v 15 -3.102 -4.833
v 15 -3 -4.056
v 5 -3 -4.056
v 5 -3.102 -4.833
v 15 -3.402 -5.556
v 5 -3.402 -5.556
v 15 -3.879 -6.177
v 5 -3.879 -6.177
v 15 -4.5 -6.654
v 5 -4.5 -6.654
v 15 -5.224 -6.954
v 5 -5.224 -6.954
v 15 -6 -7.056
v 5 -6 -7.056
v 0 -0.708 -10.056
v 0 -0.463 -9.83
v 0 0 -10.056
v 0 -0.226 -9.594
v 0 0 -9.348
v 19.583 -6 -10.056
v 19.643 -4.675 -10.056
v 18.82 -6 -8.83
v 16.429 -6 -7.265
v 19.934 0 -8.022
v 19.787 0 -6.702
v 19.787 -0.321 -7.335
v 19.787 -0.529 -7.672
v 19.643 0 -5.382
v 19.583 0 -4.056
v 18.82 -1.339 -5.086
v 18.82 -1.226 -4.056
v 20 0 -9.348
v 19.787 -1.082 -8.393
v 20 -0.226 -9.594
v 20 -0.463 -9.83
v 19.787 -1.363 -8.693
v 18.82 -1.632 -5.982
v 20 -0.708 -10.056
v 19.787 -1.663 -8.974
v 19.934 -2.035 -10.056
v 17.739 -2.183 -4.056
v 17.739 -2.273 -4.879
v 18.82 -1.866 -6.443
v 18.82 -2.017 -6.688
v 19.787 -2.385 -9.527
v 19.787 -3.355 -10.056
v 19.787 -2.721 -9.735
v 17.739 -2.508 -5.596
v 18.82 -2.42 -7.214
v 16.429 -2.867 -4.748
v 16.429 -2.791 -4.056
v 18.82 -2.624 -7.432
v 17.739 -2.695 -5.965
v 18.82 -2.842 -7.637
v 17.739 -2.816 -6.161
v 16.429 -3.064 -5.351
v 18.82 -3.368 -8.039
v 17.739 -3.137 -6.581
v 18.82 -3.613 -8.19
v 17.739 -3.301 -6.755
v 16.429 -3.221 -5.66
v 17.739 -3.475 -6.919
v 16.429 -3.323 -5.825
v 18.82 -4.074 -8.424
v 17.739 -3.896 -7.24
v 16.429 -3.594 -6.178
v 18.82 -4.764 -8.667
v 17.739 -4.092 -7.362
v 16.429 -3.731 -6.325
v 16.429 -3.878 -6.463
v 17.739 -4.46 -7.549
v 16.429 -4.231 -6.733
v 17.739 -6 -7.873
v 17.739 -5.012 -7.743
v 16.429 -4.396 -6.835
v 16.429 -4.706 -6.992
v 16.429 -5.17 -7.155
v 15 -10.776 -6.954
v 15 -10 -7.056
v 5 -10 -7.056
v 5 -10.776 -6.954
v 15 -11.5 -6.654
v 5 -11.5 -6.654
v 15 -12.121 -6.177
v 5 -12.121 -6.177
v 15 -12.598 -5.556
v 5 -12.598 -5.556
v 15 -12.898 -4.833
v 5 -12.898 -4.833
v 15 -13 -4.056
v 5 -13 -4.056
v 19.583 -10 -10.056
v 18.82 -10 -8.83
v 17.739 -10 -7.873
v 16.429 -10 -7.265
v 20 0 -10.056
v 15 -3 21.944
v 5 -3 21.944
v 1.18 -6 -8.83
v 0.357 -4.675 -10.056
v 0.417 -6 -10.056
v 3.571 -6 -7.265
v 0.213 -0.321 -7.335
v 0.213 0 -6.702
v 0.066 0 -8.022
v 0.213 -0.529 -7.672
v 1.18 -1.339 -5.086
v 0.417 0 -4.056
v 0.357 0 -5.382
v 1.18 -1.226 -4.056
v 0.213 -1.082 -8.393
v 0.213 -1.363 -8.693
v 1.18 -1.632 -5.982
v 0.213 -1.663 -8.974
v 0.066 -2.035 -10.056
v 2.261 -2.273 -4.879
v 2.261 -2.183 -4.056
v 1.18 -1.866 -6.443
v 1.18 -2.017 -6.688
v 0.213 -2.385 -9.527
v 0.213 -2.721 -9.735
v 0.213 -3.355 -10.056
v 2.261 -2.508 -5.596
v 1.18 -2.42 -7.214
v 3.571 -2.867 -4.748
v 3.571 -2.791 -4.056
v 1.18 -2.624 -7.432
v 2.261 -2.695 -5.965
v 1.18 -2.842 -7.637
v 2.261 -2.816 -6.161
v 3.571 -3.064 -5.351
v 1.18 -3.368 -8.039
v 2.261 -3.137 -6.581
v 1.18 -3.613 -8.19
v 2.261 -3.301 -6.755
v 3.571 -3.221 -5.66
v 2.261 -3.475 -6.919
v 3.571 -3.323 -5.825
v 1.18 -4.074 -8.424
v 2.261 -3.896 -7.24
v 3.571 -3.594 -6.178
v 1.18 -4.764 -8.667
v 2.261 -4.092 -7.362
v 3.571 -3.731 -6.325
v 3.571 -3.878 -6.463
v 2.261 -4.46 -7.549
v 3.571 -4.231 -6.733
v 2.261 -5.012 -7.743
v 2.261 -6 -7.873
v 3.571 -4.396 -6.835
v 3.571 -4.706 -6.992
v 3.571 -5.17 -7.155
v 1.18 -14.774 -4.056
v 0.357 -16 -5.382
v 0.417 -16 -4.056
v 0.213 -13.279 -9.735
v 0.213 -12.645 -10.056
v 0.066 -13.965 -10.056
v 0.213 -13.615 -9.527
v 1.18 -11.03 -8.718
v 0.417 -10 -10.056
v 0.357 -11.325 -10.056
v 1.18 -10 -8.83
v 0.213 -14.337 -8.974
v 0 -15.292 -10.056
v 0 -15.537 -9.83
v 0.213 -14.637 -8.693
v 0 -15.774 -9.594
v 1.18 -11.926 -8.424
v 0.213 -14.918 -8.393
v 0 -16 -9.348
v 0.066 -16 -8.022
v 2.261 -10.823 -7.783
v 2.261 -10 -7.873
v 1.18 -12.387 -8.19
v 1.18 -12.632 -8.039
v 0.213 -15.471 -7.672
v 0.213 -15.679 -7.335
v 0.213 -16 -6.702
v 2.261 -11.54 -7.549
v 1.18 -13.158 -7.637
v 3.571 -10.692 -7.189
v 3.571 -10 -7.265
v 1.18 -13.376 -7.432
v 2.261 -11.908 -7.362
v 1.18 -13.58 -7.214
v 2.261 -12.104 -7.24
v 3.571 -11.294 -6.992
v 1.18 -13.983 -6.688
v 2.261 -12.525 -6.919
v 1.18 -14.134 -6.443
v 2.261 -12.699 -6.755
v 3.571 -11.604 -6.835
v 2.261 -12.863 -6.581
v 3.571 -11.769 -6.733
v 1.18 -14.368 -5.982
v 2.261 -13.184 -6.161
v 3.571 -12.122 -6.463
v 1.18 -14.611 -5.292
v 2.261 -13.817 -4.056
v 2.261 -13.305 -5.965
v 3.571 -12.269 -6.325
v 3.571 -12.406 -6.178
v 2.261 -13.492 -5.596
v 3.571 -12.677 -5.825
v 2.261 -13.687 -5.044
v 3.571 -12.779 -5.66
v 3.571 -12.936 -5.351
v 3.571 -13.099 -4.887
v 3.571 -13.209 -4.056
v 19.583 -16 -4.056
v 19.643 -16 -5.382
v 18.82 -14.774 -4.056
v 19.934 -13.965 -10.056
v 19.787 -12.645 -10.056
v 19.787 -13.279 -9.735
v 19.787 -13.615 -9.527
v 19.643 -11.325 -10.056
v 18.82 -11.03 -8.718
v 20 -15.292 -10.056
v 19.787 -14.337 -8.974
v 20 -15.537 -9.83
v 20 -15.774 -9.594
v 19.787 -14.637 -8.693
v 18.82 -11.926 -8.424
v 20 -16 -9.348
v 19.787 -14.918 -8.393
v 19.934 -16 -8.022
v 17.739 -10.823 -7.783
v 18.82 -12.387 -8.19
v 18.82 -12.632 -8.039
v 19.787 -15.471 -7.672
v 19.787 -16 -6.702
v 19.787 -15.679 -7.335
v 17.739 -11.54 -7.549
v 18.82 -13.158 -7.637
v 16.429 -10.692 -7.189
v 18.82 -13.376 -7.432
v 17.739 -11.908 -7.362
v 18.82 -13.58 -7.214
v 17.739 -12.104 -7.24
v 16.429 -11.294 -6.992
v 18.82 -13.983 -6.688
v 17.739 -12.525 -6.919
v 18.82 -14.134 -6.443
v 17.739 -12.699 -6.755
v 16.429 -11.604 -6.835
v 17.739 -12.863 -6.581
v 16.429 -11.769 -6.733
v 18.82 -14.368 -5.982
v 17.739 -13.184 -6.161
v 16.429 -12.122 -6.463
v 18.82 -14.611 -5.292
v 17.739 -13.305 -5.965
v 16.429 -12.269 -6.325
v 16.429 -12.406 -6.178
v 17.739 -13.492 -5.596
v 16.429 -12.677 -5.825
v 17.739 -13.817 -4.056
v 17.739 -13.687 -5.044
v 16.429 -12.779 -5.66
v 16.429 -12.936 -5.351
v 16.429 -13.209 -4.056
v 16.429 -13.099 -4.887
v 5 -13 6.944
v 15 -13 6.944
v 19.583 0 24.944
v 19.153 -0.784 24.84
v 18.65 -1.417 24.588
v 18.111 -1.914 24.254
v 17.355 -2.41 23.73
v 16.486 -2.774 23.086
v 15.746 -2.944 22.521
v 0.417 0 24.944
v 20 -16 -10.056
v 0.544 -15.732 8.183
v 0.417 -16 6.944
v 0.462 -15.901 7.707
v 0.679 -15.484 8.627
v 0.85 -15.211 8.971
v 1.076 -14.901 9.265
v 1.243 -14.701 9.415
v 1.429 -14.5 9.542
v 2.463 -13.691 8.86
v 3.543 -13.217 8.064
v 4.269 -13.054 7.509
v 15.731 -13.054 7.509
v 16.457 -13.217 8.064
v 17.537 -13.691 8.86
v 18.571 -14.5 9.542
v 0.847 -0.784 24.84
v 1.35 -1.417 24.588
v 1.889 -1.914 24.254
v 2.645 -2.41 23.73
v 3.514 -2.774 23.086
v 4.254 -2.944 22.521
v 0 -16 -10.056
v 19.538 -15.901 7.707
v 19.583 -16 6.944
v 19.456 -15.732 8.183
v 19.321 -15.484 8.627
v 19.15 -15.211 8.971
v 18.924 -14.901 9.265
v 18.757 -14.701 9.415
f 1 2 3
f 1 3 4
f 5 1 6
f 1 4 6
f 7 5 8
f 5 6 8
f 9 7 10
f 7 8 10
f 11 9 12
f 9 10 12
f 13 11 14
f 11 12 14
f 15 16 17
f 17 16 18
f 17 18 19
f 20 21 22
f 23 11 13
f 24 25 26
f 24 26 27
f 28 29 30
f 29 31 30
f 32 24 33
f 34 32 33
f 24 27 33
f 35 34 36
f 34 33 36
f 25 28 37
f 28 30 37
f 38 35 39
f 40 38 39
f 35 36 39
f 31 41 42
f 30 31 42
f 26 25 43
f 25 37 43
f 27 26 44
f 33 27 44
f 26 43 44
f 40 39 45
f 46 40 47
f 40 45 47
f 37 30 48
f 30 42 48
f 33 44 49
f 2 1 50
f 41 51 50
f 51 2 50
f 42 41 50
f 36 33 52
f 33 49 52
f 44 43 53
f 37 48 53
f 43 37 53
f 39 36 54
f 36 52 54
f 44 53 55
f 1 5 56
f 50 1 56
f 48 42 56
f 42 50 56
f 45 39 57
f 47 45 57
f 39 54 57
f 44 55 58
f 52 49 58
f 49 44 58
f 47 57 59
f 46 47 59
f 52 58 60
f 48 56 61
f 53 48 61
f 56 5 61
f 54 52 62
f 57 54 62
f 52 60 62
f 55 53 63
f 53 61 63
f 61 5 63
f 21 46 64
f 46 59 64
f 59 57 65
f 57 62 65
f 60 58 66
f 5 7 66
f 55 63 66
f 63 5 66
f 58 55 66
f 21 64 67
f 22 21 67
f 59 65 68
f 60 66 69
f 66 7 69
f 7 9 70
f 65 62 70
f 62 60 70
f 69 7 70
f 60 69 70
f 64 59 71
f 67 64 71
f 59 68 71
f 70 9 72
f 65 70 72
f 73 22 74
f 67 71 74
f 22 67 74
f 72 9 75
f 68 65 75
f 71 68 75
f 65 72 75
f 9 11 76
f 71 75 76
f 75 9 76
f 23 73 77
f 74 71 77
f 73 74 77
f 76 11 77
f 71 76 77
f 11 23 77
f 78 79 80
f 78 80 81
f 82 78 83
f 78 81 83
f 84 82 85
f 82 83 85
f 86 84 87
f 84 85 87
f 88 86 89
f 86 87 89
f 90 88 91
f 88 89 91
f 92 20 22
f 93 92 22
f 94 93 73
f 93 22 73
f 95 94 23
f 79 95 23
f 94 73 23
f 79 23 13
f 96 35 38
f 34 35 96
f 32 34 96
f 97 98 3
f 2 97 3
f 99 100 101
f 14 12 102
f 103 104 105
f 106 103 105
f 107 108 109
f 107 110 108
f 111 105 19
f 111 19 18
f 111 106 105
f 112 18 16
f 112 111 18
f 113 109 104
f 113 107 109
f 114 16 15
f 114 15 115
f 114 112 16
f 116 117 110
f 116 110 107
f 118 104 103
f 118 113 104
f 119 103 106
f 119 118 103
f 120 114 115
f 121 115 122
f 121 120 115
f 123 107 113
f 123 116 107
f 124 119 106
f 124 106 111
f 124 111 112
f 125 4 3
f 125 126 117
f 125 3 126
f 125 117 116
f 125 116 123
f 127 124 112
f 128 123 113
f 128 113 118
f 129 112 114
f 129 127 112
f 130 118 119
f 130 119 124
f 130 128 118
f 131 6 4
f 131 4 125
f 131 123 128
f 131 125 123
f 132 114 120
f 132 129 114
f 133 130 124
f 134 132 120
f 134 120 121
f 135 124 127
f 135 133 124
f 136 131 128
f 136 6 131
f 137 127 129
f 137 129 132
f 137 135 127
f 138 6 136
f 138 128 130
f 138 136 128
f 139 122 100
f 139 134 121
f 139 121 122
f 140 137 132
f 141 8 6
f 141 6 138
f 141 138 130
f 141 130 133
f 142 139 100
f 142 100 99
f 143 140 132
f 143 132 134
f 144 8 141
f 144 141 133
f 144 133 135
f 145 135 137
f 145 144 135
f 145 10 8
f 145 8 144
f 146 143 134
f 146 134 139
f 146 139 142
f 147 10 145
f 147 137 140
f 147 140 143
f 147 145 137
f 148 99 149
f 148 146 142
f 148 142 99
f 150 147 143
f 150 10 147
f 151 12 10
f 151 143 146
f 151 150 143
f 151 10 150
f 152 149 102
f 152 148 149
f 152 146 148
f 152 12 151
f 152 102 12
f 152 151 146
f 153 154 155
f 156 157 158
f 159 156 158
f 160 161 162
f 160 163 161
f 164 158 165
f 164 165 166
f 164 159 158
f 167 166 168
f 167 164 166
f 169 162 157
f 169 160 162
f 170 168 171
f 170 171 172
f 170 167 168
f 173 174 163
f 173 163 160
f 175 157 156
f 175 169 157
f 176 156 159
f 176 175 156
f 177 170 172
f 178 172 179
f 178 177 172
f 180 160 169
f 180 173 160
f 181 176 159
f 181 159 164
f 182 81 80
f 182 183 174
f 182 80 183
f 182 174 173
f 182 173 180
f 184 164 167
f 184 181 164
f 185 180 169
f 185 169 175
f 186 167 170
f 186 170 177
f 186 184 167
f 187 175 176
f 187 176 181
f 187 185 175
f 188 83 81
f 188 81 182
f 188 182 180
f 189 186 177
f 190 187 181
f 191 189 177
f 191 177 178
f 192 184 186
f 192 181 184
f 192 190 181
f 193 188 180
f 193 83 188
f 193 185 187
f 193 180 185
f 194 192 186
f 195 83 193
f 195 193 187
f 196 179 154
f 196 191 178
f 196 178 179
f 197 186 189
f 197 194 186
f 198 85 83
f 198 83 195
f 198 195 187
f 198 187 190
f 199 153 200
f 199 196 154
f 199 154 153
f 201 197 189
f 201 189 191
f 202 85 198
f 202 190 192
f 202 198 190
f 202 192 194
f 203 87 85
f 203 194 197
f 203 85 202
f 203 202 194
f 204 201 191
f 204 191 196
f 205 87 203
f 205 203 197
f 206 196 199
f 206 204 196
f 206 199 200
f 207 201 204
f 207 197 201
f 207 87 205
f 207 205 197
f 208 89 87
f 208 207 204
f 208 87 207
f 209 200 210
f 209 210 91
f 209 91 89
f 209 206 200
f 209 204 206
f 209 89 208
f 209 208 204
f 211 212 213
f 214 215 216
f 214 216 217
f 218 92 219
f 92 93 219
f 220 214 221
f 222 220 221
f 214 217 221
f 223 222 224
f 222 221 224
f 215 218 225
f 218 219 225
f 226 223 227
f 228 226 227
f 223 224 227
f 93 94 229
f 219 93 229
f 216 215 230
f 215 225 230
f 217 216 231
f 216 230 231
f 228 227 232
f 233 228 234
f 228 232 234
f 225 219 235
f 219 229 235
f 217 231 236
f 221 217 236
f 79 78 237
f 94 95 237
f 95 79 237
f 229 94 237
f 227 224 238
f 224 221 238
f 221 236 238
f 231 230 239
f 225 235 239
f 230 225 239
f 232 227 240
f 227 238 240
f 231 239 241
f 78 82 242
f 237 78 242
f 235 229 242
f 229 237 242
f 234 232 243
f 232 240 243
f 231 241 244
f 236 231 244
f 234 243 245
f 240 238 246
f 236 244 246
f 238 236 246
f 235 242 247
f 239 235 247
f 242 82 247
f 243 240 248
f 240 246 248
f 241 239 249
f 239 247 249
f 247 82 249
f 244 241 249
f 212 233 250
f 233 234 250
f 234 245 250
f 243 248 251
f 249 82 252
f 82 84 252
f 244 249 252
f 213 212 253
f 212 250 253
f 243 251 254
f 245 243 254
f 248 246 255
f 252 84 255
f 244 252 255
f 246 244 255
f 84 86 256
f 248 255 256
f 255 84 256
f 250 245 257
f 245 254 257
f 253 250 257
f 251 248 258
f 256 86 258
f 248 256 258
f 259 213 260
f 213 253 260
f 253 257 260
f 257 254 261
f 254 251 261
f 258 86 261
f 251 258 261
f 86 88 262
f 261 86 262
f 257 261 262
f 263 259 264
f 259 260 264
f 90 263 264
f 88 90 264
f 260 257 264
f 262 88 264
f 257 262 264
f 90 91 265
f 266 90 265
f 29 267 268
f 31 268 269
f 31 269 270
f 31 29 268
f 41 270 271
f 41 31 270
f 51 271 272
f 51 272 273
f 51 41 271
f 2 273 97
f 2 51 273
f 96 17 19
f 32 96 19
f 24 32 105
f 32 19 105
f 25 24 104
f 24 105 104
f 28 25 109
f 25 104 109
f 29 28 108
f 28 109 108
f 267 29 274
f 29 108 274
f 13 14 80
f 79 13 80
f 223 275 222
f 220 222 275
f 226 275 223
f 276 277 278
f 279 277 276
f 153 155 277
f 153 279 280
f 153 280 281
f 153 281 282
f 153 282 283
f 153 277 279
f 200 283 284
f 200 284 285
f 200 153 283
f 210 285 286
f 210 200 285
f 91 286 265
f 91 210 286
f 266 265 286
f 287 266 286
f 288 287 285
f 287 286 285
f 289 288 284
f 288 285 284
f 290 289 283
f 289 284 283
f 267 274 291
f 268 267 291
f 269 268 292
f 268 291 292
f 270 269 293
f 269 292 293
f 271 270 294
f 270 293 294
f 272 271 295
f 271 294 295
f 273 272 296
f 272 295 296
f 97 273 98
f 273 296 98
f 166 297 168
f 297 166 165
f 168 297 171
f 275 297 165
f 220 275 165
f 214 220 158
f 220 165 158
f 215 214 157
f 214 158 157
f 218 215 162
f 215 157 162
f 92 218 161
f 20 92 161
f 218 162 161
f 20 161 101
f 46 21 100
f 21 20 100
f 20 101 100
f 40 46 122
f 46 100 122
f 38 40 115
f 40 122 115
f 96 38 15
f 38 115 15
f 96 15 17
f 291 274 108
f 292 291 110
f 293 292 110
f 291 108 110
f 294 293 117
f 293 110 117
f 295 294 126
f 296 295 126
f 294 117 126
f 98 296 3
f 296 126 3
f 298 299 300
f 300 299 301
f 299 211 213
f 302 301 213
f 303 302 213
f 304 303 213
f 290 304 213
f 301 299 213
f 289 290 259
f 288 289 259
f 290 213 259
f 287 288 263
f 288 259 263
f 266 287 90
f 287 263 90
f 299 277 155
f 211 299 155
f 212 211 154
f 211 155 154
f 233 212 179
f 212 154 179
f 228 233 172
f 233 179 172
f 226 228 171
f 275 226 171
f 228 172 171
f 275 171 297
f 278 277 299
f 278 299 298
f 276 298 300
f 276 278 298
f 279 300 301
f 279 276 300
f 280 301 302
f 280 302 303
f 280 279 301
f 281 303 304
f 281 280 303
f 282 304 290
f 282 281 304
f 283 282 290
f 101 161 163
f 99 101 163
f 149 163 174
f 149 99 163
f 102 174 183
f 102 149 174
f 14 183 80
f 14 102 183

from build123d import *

# Parameters (mm, degrees)
F1_DEPTH     = 20
F2_T1_DEPTH  = 20
F2_T3_DEPTH  = 35
F3_T1_DEPTH  = 4
F3_T3_DEPTH  = 23.5
F3_T5_DEPTH  = 38.5
F3_T8_ANGLE  = 89.9999999987
F3_T10_ANGLE = 89.9999999987
F3_T12_ANGLE = 89.9999999987
F3_T14_ANGLE = 89.9999999987
F3_T18_ANGLE = 359.64
F3_S19_R     = 5
F3_T20_DEPTH = 6
F3_T24_ANGLE = 359.64
F3_S25_R     = 5
F3_T26_DEPTH = 6
F3_T30_ANGLE = 328.8283154119
F3_S31_R     = 5
F3_T32_DEPTH = 6
F3_T36_ANGLE = 328.8283154119
F3_S37_R     = 5
F3_T38_DEPTH = 6


# Not quite as in the source:
# - a fillet or chamfer that OpenCascade refuses, or shapes differently, is made with other operations: its cross-section is extruded or revolved along the edge and cut away or added


with BuildPart() as f1:
    # F0 (on Right) → F1 (new body)
    with BuildSketch(Plane.YZ):
        Polygon((0, -10.05617938), (0, 24.94382062), (-3, 24.94382062), (-3, -7.05617938), (-13, -7.05617938), (-13, 9.94382062), (-16, 9.94382062), (-16, -10.05617938), align=None)
    extrude(amount=F1_DEPTH)

    # F2: fillet of radius 3 on 5 edges, made by hand

    # F2_s2 → F2_t1 (join)
    with BuildSketch(Plane.YZ):
        with BuildLine():
            ThreePointArc((-10, -7.05617938), (-12.1213203436, -6.1774997235), (-13, -4.05617938))
            Line((-13, -4.05617938), (-13, -7.05617938))
            Line((-13, -7.05617938), (-10, -7.05617938))
        make_face()
        with BuildLine():
            ThreePointArc((-3, -4.05617938), (-3.8786796564, -6.1774997235), (-6, -7.05617938))
            Line((-6, -7.05617938), (-3, -7.05617938))
            Line((-3, -7.05617938), (-3, -4.05617938))
        make_face()
    extrude(amount=F2_T1_DEPTH)

    # F2_s4 → F2_t3 (cut)
    with BuildSketch(Plane.YZ.offset(-7.5)):
        with BuildLine():
            ThreePointArc((0, 24.94382062), (-2.1213203436, 24.0651409636), (-3, 21.94382062))
            Line((-3, 21.94382062), (-3, 24.94382062))
            Line((-3, 24.94382062), (0, 24.94382062))
        make_face()
        with BuildLine():
            ThreePointArc((-13, 6.94382062), (-13.8786796564, 9.0651409636), (-16, 9.94382062))
            Line((-16, 9.94382062), (-13, 9.94382062))
            Line((-13, 9.94382062), (-13, 6.94382062))
        make_face()
        with BuildLine():
            ThreePointArc((-16, 6.94382062), (-15.1213203436, 9.0651409636), (-13, 9.94382062))
            Line((-13, 9.94382062), (-16, 9.94382062))
            Line((-16, 9.94382062), (-16, 6.94382062))
        make_face()
    extrude(amount=F2_T3_DEPTH, mode=Mode.SUBTRACT)

    # F3: fillet of radius 5 on 4 edges, made by hand

    # F3_s2 → F3_t1 (cut)
    with BuildSketch(Plane.XZ.offset(6)):
        with BuildLine():
            ThreePointArc((20, -12.05617938), (18.5355339059, -8.520645474), (15, -7.05617938))
            Line((15, -7.05617938), (20, -7.05617938))
            Line((20, -7.05617938), (20, -12.05617938))
        make_face()
        with BuildLine():
            ThreePointArc((0, -12.05617938), (1.4644660941, -8.520645474), (5, -7.05617938))
            Line((5, -7.05617938), (0, -7.05617938))
            Line((0, -7.05617938), (0, -12.05617938))
        make_face()
    extrude(amount=F3_T1_DEPTH, mode=Mode.SUBTRACT)

    # F3_s4 → F3_t3 (cut)
    with BuildSketch(Plane.XY.offset(-4.05617938)):
        with BuildLine():
            ThreePointArc((20, -18), (18.5355339059, -14.4644660941), (15, -13))
            Line((15, -13), (20, -13))
            Line((20, -13), (20, -18))
        make_face()
        with BuildLine():
            ThreePointArc((0, -18), (1.4644660941, -14.4644660941), (5, -13))
            Line((5, -13), (0, -13))
            Line((0, -13), (0, -18))
        make_face()
    extrude(amount=F3_T3_DEPTH, mode=Mode.SUBTRACT)

    # F3_s6 → F3_t5 (cut)
    with BuildSketch(Plane.XY.offset(-4.05617938)):
        with BuildLine():
            ThreePointArc((20, 2), (18.5355339059, -1.5355339059), (15, -3))
            Line((15, -3), (20, -3))
            Line((20, -3), (20, 2))
        make_face()
        with BuildLine():
            ThreePointArc((0, 2), (1.4644660941, -1.5355339059), (5, -3))
            Line((5, -3), (0, -3))
            Line((0, -3), (0, 2))
        make_face()
    extrude(amount=F3_T5_DEPTH, mode=Mode.SUBTRACT)

    # F3_s7 → F3_t8 (revolve, cut)
    with BuildSketch(Plane.XY.offset(-4.05617938)):
        with BuildLine():
            ThreePointArc((0, 2), (1.4644660941, -1.5355339059), (5, -3))
            Line((5, -3), (0, -3))
            Line((0, -3), (0, 2))
        make_face()
    revolve(axis=Axis((0, -6, -4.05617938), (-1, 0, 0)), revolution_arc=F3_T8_ANGLE, mode=Mode.SUBTRACT)

    # F3_s9 → F3_t10 (revolve, cut)
    with BuildSketch(Plane.XY.offset(-4.05617938)):
        with BuildLine():
            ThreePointArc((20, 2), (18.5355339059, -1.5355339059), (15, -3))
            Line((15, -3), (20, -3))
            Line((20, -3), (20, 2))
        make_face()
    revolve(axis=Axis((20, -6, -4.05617938), (-1, 0, 0)), revolution_arc=F3_T10_ANGLE, mode=Mode.SUBTRACT)

    # F3_s11 → F3_t12 (revolve, cut)
    with BuildSketch(Plane.XZ.offset(10)):
        with BuildLine():
            ThreePointArc((0, -12.05617938), (1.4644660941, -8.5206454741), (5, -7.05617938))
            Line((5, -7.05617938), (0, -7.05617938))
            Line((0, -7.05617938), (0, -12.05617938))
        make_face()
    revolve(axis=Axis((0, -10, -4.05617938), (-1, 0, 0)), revolution_arc=F3_T12_ANGLE, mode=Mode.SUBTRACT)

    # F3_s13 → F3_t14 (revolve, cut)
    with BuildSketch(Plane.XZ.offset(10)):
        with BuildLine():
            ThreePointArc((20, -12.05617938), (18.5355339059, -8.5206454741), (15, -7.05617938))
            Line((15, -7.05617938), (20, -7.05617938))
            Line((20, -7.05617938), (20, -12.05617938))
        make_face()
    revolve(axis=Axis((20, -10, -4.05617938), (-1, 0, 0)), revolution_arc=F3_T14_ANGLE, mode=Mode.SUBTRACT)


with BuildPart() as f3_tool16:
    # F3_s17 → F3_t18 (revolve)
    with BuildSketch(Plane(origin=(0, 0.0429965174, 6.8430181729), x_dir=(1, 0, 0), z_dir=(0, 0.006283144, 0.9999802609))):
        with BuildLine():
            ThreePointArc((19.5825756949, -16.0433131985), (17.7386127875, -13.8600130659), (15, -13.0433131986))
            Line((15, -13.0433131986), (20, -13.0433131986))
            Line((20, -13.0433131986), (20, -16.0433131985))
            Line((20, -16.0433131985), (19.5825756949, -16.0433131985))
        make_face()
    revolve(axis=Axis((20, -15.9999999999, 6.9438206201), (-1, 0, 0)), revolution_arc=F3_T18_ANGLE)

    # F3_s19 → F3_t20 (cut, symmetric)
    with BuildSketch(Plane.XY.offset(6.9)):
        with Locations((15, -18)):
            Circle(F3_S19_R)
    extrude(amount=F3_T20_DEPTH, both=True, mode=Mode.SUBTRACT)


with BuildPart() as f1_1:
    add(f1.part)

    # F3_t15: cut F3_tool16
    add(f3_tool16.part, mode=Mode.SUBTRACT)


with BuildPart() as f3_tool22:
    # F3_s23 → F3_t24 (revolve)
    with BuildSketch(Plane(origin=(0, 0.0429965174, 6.8430181729), x_dir=(1, 0, 0), z_dir=(0, 0.006283144, 0.9999802609))):
        with BuildLine():
            ThreePointArc((0.4174243051, -16.0433131985), (2.2613872125, -13.8600130659), (5, -13.0433131986))
            Line((5, -13.0433131986), (0, -13.0433131986))
            Line((0, -13.0433131986), (0, -16.0433131985))
            Line((0, -16.0433131985), (0.4174243051, -16.0433131985))
        make_face()
    revolve(axis=Axis((0, -15.9999999999, 6.9438206201), (-1, 0, 0)), revolution_arc=F3_T24_ANGLE)

    # F3_s25 → F3_t26 (cut, symmetric)
    with BuildSketch(Plane.XY.offset(6.9)):
        with Locations((5, -18)):
            Circle(F3_S25_R)
    extrude(amount=F3_T26_DEPTH, both=True, mode=Mode.SUBTRACT)


with BuildPart() as f1_2:
    add(f1_1.part)

    # F3_t21: cut F3_tool22
    add(f3_tool22.part, mode=Mode.SUBTRACT)


with BuildPart() as f3_tool28:
    # F3_s29 → F3_t30 (revolve)
    with BuildSketch(Plane.XY.offset(21.9438206201)):
        with BuildLine():
            ThreePointArc((15, -3), (17.7386127875, -2.1833001327), (19.5825756949, -1e-10))
            Line((19.5825756949, -1e-10), (20, -1e-10))
            Line((20, -1e-10), (20, -3))
            Line((20, -3), (15, -3))
        make_face()
    revolve(axis=Axis((20, -1e-10, 21.9438206201), (-1, 0, 0)), revolution_arc=F3_T30_ANGLE)

    # F3_s31 → F3_t32 (cut, symmetric)
    with BuildSketch(Plane.XY.offset(21.9)):
        with Locations((15, 2)):
            Circle(F3_S31_R)
    extrude(amount=F3_T32_DEPTH, both=True, mode=Mode.SUBTRACT)


with BuildPart() as f1_3:
    add(f1_2.part)

    # F3_t27: cut F3_tool28
    add(f3_tool28.part, mode=Mode.SUBTRACT)


with BuildPart() as f3_tool34:
    # F3_s35 → F3_t36 (revolve)
    with BuildSketch(Plane.XY.offset(21.9438206201)):
        with BuildLine():
            ThreePointArc((5, -3), (2.2613872125, -2.1833001327), (0.4174243051, -1e-10))
            Line((0.4174243051, -1e-10), (0, -1e-10))
            Line((0, -1e-10), (0, -3))
            Line((0, -3), (5, -3))
        make_face()
    revolve(axis=Axis((0, -1e-10, 21.9438206201), (-1, 0, 0)), revolution_arc=F3_T36_ANGLE)

    # F3_s37 → F3_t38 (cut, symmetric)
    with BuildSketch(Plane.XY.offset(21.9)):
        with Locations((5, 2)):
            Circle(F3_S37_R)
    extrude(amount=F3_T38_DEPTH, both=True, mode=Mode.SUBTRACT)


with BuildPart() as f1_4:
    add(f1_3.part)

    # F3_t33: cut F3_tool34
    add(f3_tool34.part, mode=Mode.SUBTRACT)


solid = f1_4.part
